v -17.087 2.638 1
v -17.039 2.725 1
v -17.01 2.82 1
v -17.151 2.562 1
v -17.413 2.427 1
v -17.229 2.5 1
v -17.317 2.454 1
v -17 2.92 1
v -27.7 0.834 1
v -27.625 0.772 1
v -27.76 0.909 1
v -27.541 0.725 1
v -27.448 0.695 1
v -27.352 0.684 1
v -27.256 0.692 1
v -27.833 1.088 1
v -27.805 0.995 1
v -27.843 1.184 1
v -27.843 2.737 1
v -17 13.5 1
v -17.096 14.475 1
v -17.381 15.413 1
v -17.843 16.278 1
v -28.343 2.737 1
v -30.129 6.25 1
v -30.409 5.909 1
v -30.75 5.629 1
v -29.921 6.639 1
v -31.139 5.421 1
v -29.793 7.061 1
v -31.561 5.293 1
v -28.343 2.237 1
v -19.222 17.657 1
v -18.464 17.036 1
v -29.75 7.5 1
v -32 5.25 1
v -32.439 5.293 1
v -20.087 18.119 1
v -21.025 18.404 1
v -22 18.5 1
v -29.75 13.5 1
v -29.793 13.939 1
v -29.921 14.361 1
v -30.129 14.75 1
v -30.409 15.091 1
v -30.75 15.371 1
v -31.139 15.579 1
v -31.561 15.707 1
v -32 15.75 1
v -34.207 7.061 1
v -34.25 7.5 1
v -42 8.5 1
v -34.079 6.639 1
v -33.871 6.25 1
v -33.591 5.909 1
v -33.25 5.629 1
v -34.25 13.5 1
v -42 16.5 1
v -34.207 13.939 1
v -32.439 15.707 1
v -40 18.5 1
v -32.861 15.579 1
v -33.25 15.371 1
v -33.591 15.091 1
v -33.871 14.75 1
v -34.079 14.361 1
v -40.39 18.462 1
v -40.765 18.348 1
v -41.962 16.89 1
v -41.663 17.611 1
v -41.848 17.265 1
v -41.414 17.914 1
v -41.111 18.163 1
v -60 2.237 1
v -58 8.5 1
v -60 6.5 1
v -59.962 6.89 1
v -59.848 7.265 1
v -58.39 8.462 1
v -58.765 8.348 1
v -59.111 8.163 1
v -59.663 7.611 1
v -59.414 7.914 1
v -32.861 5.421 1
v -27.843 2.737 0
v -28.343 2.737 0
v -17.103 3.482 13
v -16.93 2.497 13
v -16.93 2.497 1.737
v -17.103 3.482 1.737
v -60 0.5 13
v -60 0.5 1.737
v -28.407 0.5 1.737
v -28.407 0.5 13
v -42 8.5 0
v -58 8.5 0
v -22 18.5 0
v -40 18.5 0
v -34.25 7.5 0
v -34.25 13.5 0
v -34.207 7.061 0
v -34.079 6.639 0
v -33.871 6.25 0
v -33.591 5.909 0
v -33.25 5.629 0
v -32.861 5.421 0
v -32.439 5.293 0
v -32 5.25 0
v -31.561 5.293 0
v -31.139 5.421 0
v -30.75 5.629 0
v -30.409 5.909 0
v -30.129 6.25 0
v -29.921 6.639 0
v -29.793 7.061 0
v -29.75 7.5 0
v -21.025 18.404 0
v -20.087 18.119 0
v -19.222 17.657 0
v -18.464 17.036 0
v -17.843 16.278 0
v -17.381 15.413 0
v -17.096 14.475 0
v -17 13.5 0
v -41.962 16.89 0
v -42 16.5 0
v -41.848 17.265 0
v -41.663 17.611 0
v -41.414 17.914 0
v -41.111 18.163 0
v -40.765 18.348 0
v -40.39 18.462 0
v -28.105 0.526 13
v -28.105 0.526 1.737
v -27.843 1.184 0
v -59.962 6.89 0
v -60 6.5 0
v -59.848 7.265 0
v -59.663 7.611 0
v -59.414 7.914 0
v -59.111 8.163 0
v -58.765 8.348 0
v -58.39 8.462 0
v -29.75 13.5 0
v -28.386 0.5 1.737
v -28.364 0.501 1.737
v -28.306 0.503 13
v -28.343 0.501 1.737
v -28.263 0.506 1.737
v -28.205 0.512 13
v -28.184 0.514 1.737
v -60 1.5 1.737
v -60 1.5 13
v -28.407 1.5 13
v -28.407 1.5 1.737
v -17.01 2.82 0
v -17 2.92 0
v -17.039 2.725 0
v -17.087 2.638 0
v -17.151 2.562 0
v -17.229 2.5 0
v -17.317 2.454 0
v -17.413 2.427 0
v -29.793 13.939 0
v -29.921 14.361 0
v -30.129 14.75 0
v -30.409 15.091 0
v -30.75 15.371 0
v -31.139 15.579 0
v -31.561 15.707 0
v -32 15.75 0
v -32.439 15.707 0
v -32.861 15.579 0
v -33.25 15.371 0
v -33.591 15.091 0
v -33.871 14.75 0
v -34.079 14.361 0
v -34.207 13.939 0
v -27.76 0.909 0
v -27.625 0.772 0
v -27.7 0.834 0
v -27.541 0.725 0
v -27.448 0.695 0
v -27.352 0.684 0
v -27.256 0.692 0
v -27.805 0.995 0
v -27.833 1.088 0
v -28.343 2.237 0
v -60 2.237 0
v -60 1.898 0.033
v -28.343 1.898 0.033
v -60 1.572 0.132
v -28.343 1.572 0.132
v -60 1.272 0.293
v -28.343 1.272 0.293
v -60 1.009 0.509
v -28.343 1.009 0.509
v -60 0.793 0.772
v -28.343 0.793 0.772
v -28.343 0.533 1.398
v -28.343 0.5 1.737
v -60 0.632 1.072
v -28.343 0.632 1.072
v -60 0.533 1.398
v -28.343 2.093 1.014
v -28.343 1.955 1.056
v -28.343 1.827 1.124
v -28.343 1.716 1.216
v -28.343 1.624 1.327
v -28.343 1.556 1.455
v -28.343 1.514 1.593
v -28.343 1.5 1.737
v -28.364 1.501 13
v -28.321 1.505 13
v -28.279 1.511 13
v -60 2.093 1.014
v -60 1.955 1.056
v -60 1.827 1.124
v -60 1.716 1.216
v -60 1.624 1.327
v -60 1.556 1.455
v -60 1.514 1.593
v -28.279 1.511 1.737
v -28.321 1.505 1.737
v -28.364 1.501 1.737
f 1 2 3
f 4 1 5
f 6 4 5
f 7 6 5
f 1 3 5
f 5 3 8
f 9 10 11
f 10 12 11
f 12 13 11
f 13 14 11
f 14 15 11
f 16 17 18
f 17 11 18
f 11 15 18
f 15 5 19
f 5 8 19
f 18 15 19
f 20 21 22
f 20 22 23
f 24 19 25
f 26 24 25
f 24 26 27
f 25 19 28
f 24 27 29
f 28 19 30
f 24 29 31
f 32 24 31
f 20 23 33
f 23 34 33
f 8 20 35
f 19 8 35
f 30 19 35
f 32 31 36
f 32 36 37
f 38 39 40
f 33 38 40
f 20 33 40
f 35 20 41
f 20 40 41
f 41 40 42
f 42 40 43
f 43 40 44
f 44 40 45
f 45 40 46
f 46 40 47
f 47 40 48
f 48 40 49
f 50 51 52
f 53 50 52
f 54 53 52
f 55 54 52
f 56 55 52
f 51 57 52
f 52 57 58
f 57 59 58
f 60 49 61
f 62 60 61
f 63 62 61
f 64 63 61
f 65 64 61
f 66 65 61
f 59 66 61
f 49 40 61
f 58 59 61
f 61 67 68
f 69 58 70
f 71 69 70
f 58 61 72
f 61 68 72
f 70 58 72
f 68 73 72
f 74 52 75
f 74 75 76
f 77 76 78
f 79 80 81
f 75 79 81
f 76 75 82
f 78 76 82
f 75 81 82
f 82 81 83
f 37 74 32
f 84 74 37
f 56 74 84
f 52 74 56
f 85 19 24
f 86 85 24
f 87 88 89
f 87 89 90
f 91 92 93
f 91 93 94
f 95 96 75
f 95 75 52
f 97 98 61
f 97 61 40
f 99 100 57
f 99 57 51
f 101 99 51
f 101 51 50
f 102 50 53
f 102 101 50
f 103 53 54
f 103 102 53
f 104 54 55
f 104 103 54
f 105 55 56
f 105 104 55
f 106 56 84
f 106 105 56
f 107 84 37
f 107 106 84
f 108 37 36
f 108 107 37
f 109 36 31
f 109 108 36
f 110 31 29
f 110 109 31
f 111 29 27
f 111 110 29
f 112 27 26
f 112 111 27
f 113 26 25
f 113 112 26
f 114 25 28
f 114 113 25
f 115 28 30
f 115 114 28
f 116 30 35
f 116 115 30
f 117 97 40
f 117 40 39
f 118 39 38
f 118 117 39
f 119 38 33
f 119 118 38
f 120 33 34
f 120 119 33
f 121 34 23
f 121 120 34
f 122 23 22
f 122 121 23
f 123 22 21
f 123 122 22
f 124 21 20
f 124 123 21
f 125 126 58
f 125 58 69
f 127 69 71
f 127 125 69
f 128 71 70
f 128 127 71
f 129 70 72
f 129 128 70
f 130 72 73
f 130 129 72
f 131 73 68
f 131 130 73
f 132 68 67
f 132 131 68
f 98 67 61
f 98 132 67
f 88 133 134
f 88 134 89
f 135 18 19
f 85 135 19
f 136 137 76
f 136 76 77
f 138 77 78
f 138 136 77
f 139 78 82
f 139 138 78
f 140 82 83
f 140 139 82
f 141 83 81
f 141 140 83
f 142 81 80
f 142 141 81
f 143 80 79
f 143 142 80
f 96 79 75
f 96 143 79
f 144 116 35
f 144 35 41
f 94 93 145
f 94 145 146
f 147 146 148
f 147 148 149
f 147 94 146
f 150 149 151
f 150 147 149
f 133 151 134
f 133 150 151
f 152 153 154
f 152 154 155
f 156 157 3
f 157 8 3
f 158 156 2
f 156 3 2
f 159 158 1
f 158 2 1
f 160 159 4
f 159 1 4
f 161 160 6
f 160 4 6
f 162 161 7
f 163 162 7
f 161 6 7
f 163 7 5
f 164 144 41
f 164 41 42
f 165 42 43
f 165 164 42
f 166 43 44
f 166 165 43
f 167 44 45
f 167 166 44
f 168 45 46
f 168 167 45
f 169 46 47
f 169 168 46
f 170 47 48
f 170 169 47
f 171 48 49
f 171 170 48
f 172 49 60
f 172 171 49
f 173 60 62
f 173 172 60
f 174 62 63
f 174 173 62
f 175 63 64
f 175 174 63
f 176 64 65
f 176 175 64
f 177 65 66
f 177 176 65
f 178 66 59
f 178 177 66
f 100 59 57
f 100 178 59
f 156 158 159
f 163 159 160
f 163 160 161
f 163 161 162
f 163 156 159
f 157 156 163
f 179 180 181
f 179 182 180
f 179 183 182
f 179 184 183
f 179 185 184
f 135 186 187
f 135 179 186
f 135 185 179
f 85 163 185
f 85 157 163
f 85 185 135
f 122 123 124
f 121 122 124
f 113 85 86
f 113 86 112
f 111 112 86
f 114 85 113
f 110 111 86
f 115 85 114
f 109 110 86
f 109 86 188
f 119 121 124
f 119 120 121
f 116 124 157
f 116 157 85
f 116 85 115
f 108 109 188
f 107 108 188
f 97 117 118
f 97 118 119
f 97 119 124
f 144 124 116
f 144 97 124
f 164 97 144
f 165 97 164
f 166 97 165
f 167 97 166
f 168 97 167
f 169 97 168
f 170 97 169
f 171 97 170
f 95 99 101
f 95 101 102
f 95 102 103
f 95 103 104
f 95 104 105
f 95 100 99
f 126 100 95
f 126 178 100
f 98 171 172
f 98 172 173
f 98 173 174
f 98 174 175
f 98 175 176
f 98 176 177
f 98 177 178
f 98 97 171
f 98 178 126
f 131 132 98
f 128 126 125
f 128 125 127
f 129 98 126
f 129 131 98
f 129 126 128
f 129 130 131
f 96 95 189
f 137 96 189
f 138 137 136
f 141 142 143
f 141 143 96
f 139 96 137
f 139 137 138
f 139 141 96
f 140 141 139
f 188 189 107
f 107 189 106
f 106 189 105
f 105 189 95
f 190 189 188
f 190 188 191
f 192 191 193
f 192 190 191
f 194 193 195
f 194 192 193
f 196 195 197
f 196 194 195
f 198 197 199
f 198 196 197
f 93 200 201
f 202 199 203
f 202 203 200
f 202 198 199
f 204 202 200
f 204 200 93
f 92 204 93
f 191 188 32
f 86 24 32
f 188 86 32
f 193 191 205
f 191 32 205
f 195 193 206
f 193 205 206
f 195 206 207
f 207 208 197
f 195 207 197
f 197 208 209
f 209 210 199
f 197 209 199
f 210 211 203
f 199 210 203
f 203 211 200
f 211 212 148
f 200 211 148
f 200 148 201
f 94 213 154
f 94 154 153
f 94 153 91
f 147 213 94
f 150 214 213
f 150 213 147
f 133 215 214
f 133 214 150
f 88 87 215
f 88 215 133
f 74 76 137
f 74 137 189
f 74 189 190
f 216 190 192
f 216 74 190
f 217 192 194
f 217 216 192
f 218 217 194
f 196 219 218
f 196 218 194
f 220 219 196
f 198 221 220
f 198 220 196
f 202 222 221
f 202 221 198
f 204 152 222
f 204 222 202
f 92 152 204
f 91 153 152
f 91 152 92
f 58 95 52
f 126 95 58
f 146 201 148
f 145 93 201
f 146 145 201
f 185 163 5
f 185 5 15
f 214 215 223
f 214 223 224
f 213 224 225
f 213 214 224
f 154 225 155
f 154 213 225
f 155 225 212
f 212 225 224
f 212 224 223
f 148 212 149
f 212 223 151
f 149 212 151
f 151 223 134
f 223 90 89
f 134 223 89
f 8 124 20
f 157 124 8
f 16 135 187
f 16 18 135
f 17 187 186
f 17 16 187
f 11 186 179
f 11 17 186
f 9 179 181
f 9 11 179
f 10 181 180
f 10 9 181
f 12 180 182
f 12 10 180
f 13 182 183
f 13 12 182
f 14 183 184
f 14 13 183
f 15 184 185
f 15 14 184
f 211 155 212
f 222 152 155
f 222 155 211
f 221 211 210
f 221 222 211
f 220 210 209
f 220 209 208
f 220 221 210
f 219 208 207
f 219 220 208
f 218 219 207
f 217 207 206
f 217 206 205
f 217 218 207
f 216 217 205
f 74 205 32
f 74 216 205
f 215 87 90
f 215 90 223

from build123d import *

# Parameters (mm, degrees)
BASIS_BLECH1_DEPTH             = 1
KANTE_LASCHE2_STRIP_W          = 5.4732
KANTE_LASCHE2_STRIP_H          = 1
KANTE_LASCHE2_STRIP_CUT_DEPTH  = 31.657436361
KANTE_LASCHE2_RELIEF_W         = 5.9732
KANTE_LASCHE2_RELIEF_H         = 0.5
KANTE_LASCHE2_RELIEF_CUT_DEPTH = 1
KANTE_LASCHE2_DEPTH            = 31.657436361
KANTE_LASCHE3_STRIP_CUT_DEPTH  = 11.2634
KANTE_LASCHE3_DEPTH            = 11.2634
VERRUNDUNG1_R                  = 0.5


# Sheet-metal steps are written as plain solids
with BuildPart() as part:
    # Skizze1 → Basis-Blech1 (new body)
    with BuildSketch(Plane.XY):
        with BuildLine():
            Line((-28.342563639, 0.5), (-60, 0.5))
            Line((-60, 0.5), (-60, 6.5))
            ThreePointArc((-60, 6.5), (-59.414213562, 7.914213562), (-58, 8.5))
            Line((-58, 8.5), (-42, 8.5))
            Line((-42, 8.5), (-42, 16.5))
            ThreePointArc((-42, 16.5), (-41.414213562, 17.914213562), (-40, 18.5))
            Line((-40, 18.5), (-22, 18.5))
            ThreePointArc((-22, 18.5), (-18.464466094, 17.035533906), (-17, 13.5))
            Line((-17, 13.5), (-17, 2.5))
            Line((-17, 2.5), (-28.342563639, 0.5))
        make_face()
        with BuildLine():
            Line((-29.75, 7.5), (-29.75, 13.5))
            ThreePointArc((-29.75, 13.5), (-32, 15.75), (-34.25, 13.5))
            Line((-34.25, 13.5), (-34.25, 7.5))
            ThreePointArc((-34.25, 7.5), (-32, 5.25), (-29.75, 7.5))
        make_face(mode=Mode.SUBTRACT)
    extrude(amount=BASIS_BLECH1_DEPTH)

    # Kante-Lasche2 strip (across the edge) → Kante-Lasche2 strip cut (cut)
    with BuildSketch(Plane(origin=(-60, 0.5, 1), x_dir=(0, 1, 0), z_dir=(1, 0, 0))):
        with Locations((-1, -0.5)):
            Rectangle(KANTE_LASCHE2_STRIP_W, KANTE_LASCHE2_STRIP_H)
    extrude(amount=KANTE_LASCHE2_STRIP_CUT_DEPTH, mode=Mode.SUBTRACT)

    # Kante-Lasche2 relief (on the sheet) → Kante-Lasche2 relief cut (cut)
    with BuildSketch(Plane(origin=(-60, 2.2366, 1), x_dir=(0, 1, 0), z_dir=(0, 0, 1))):
        with Locations((-2.4866, -31.907436361)):
            Rectangle(KANTE_LASCHE2_RELIEF_W, KANTE_LASCHE2_RELIEF_H)
    extrude(amount=-KANTE_LASCHE2_RELIEF_CUT_DEPTH, mode=Mode.SUBTRACT)

    # Kante-Lasche2 section (across the edge) → Kante-Lasche2 (add)
    with BuildSketch(Plane(origin=(-60, 0.5, 1), x_dir=(0, 1, 0), z_dir=(1, 0, 0))):
        with BuildLine():
            Line((0, 0.7366), (0, 12))
            Line((0, 12), (1, 12))
            Line((1, 12), (1, 0.7366))
            ThreePointArc((1, 0.7366), (1.215745145, 0.215745145), (1.7366, 0))
            Line((1.7366, 0), (1.7366, -1))
            ThreePointArc((1.7366, -1), (0.508638364, -0.491361636), (0, 0.7366))
        make_face()
    extrude(amount=KANTE_LASCHE2_DEPTH)

    # Kante-Lasche3 strip (across the edge) → Kante-Lasche3 strip cut (cut)
    with BuildSketch(Plane(origin=(-28.342563639, 1.5, 13), x_dir=(-0.1736481776669238, 0.9848077530122092, 3.1093246385391698e-15), z_dir=(0, 0, -1))):
        Polygon((-1.92402835, 5.152936518), (-0.973617144, -0.237113276), (0.011190609, -0.063465098), (-0.939220597, 5.326584696), align=None)
    extrude(amount=KANTE_LASCHE3_STRIP_CUT_DEPTH, mode=Mode.SUBTRACT)

    # Kante-Lasche3 section (across the edge) → Kante-Lasche3 (add)
    with BuildSketch(Plane(origin=(-28.342563639, 1.5, 13), x_dir=(-0.1736481776669238, 0.9848077530122092, 3.1093246385391698e-15), z_dir=(0, 0, -1))):
        with BuildLine():
            Line((-1, 0.06444415), (-1, 11.412511336))
            Line((-1, 11.412511336), (0, 11.412511336))
            Line((0, 11.412511336), (0, 0.06444415))
            ThreePointArc((0, 0.06444415), (0.002802985, 0.000245229), (0.011190609, -0.063465098))
            Line((0.011190609, -0.063465098), (-0.973617144, -0.237113276))
            ThreePointArc((-0.973617144, -0.237113276), (-0.993391713, -0.086910513), (-1, 0.06444415))
        make_face()
    extrude(amount=KANTE_LASCHE3_DEPTH)

    # Verrundung1
    verrundung1_edges = [part.edges().sort_by_distance(p)[0] for p in [
        (-17, 2.5, 0.5),
        (-27.842563639, 0.58816349, 0.5),
    ]]
    fillet(verrundung1_edges, radius=VERRUNDUNG1_R)


solid = part.part
